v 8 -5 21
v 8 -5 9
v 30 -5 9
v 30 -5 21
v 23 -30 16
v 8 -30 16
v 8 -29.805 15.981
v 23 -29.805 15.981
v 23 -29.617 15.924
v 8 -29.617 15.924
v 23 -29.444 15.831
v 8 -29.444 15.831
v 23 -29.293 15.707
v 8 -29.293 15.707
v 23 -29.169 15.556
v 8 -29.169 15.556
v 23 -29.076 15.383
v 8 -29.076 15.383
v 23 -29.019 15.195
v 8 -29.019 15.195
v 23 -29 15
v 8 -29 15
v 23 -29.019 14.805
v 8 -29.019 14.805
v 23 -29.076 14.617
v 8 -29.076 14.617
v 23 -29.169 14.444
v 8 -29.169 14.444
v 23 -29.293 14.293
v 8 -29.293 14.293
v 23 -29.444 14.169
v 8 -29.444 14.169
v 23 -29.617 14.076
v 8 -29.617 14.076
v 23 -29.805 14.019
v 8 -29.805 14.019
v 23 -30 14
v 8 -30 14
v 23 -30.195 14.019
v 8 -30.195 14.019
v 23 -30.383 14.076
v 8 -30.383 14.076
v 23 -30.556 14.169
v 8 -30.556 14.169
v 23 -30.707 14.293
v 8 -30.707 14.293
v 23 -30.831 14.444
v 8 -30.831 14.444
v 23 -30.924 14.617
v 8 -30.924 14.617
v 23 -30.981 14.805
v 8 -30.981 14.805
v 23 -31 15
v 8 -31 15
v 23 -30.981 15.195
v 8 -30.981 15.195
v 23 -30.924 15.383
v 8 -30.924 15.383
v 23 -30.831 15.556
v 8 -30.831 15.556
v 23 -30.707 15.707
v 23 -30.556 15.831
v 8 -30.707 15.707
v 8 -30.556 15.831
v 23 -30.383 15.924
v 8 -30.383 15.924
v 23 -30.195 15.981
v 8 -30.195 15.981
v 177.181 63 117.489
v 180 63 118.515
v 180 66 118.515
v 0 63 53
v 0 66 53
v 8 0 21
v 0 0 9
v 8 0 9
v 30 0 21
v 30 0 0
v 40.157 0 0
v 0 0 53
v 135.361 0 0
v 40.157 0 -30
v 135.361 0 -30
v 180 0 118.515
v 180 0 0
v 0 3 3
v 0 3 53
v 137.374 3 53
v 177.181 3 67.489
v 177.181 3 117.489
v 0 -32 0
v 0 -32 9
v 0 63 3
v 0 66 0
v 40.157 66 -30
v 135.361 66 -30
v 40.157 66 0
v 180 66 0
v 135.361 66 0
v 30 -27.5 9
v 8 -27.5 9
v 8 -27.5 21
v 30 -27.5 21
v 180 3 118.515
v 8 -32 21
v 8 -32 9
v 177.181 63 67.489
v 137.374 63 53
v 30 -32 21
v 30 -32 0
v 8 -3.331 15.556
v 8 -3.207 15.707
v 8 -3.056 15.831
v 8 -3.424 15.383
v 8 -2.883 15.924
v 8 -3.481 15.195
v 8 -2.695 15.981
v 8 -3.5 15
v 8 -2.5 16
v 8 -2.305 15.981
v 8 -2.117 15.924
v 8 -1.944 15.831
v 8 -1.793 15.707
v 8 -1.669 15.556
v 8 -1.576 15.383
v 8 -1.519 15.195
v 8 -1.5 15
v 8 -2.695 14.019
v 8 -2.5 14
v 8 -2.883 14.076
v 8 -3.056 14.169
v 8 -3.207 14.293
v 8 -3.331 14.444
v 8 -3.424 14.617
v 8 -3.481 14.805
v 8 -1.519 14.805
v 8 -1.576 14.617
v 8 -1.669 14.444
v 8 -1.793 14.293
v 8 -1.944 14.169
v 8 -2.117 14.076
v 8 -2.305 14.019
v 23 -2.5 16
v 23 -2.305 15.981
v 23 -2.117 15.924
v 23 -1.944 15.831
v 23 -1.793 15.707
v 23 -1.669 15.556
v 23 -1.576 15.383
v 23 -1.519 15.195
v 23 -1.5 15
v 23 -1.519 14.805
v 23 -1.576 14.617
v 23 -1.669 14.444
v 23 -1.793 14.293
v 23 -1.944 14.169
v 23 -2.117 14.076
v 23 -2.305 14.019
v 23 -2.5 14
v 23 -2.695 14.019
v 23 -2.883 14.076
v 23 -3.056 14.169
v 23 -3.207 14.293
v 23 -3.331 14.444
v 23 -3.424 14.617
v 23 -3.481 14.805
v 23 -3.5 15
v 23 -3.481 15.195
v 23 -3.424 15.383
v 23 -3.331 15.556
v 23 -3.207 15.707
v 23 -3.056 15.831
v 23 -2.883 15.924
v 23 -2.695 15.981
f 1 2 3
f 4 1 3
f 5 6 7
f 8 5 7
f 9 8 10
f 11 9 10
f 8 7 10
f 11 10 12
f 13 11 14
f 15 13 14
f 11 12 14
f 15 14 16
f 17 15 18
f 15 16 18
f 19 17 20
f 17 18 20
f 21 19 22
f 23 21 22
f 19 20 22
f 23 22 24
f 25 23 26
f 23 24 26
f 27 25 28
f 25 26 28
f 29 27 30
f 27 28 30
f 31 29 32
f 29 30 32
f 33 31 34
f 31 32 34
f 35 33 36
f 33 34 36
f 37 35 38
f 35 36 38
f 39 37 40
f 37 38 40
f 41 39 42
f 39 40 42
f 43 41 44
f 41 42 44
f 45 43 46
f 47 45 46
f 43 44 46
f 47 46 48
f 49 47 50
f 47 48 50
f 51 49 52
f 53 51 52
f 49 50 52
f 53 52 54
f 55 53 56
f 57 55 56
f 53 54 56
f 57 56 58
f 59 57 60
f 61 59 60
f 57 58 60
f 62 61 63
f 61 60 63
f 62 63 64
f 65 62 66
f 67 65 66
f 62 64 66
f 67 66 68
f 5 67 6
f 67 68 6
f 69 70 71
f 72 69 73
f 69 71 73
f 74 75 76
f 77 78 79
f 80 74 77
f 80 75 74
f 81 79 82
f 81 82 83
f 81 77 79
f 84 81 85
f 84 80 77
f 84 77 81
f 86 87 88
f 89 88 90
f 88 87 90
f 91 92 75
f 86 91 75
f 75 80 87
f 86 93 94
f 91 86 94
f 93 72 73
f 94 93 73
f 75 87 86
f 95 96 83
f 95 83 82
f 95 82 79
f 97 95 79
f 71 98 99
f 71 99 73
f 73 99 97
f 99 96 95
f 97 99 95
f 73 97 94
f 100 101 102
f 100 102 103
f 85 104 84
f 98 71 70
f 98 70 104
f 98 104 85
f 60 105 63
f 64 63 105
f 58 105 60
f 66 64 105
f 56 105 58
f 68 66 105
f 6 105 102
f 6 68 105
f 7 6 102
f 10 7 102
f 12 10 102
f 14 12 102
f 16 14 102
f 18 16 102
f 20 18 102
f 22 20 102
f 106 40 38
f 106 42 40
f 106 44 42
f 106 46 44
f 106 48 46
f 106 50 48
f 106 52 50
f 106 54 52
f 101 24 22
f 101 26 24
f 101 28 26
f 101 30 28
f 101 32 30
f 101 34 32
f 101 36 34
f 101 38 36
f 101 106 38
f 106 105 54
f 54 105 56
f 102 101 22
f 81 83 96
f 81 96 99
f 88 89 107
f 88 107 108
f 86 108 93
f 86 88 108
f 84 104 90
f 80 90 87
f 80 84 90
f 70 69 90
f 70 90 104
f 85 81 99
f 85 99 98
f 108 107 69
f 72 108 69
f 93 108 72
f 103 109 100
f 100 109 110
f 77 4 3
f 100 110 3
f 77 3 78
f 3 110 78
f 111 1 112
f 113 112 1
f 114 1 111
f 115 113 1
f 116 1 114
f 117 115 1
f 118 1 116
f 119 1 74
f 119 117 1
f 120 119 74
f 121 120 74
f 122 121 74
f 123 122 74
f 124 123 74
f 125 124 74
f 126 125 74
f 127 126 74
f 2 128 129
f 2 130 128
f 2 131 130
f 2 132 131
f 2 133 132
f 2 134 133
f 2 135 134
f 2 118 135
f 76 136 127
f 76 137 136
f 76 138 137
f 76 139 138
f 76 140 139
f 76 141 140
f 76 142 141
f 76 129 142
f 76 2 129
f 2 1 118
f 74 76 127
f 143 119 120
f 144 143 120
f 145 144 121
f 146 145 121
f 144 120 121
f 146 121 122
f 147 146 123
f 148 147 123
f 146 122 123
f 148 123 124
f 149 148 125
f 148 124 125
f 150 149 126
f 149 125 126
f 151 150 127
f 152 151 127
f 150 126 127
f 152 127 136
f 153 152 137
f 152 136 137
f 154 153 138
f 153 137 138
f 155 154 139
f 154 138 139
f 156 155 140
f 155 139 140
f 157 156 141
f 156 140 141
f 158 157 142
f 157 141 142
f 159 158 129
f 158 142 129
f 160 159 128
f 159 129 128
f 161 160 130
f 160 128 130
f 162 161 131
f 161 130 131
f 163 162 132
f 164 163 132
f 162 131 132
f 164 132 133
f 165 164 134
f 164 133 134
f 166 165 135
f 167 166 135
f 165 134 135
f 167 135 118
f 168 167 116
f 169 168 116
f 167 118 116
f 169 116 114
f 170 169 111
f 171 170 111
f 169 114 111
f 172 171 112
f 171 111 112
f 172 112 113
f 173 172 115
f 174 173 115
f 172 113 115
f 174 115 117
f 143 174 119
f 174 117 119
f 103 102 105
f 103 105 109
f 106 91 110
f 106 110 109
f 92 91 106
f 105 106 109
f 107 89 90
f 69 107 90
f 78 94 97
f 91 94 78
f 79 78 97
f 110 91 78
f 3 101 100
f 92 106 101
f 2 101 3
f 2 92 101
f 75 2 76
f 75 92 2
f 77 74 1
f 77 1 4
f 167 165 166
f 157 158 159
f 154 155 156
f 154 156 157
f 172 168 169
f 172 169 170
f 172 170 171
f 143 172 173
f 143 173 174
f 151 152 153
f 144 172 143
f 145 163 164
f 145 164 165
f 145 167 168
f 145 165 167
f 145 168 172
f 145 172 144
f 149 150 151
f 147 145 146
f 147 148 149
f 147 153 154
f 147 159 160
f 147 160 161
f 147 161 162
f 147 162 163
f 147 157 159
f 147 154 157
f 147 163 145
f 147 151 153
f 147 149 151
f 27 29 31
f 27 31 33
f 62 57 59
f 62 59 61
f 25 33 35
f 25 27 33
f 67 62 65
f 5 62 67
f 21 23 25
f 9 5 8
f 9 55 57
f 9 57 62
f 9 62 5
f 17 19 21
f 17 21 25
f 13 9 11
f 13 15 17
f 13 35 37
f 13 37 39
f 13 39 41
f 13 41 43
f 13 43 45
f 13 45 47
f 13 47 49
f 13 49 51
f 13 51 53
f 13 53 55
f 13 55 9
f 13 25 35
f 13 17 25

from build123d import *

# Parameters (mm, degrees)
SKETCH_1_W          = 180
SKETCH_1_H          = 66
EXTRUDE_1_DEPTH     = 3
SKETCH_2_W          = 180
SKETCH_2_H          = 3
EXTRUDE_2_DEPTH     = 50
SKETCH_3_W          = 9
SKETCH_3_H          = 32
EXTRUDE_3_DEPTH     = 30
SKETCH_4_W          = 22
SKETCH_4_H          = 5
SKETCH_4_H_2        = 4.5
EXTRUDE_4_DEPTH     = 12
SKETCH_9_W          = 180
SKETCH_9_H          = 66
EXTRUDE_7_DEPTH     = 30
EXTRUDE_8_DEPTH     = 66
EXTRUDE_9_DEPTH     = 3
EXTRUDE_10_DEPTH    = 3
EXTRUDE_11_DEPTH    = 60
SKETCH_16_R         = 1
CUT_EXTRUDE_1_DEPTH = 15
SKETCH_17_W         = 40.157277222
SKETCH_17_H         = 30
SKETCH_17_W_2       = 44.638770814
CUT_EXTRUDE_2_DEPTH = 67


with BuildPart() as part:
    # 草圖1 → 填料-伸長1 (new body)
    with BuildSketch(Plane.XY):
        with Locations((90, 33)):
            Rectangle(SKETCH_1_W, SKETCH_1_H)
    extrude(amount=EXTRUDE_1_DEPTH)

    # 草圖2 → 填料-伸長2 (add)
    with BuildSketch(Plane.XY.offset(3)):
        with Locations((90, 1.5)):
            Rectangle(SKETCH_2_W, SKETCH_2_H)
        with Locations((90, 64.5)):
            Rectangle(SKETCH_2_W, SKETCH_2_H)
    extrude(amount=EXTRUDE_2_DEPTH)

    # 草圖3 → 填料-伸長3 (add)
    with BuildSketch(Plane.ZY):
        with Locations((4.5, -16)):
            Rectangle(SKETCH_3_W, SKETCH_3_H)
    extrude(amount=-EXTRUDE_3_DEPTH)

    # 草圖4 → 填料-伸長4 (add)
    with BuildSketch(Plane.XY.offset(9)):
        with Locations((19, -2.5)):
            Rectangle(SKETCH_4_W, SKETCH_4_H)
        with Locations((19, -29.75)):
            Rectangle(SKETCH_4_W, SKETCH_4_H_2)
    extrude(amount=EXTRUDE_4_DEPTH)

    # 草圖9 → 填料-伸長7 (add)
    with BuildSketch(Plane(origin=(0, 0, 0), x_dir=(-1, 0, 0), z_dir=(0, 0, -1))):
        with Locations((-90, 33)):
            Rectangle(SKETCH_9_W, SKETCH_9_H)
    extrude(amount=EXTRUDE_7_DEPTH)

    # 草圖10 → 填料-伸長8 (add)
    with BuildSketch(Plane.XZ):
        Polygon((0, 0), (180, 0), (180, 68.514642168), (0, 3), align=None)
    extrude(amount=-EXTRUDE_8_DEPTH)

    # 草圖11 → 填料-伸長9 (add)
    with BuildSketch(Plane.XZ):
        Polygon((180, 68.514642168), (180, 118.514642168), (0, 53), (137.373870973, 53), align=None)
    extrude(amount=-EXTRUDE_9_DEPTH)

    # 草圖12 → 填料-伸長10 (add)
    with BuildSketch(Plane(origin=(0, 66, 0), x_dir=(1, 0, 0), z_dir=(0, 1, 0))):
        Polygon((180, -68.514642168), (180, -118.514642168), (0, -53), (137.373870973, -53), align=None)
    extrude(amount=-EXTRUDE_10_DEPTH)

    # 草圖14 → 填料-伸長11 (add)
    with BuildSketch(Plane.XZ.offset(-63)):
        Polygon((180, 118.514642168), (180, 68.514642168), (177.180922138, 67.488581738), (177.180922138, 117.488581738), align=None)
    extrude(amount=EXTRUDE_11_DEPTH)

    # 草圖16 → 除料-伸長1 (cut)
    with BuildSketch(Plane.ZY.offset(-8)):
        with Locations((15, -2.5)):
            Circle(SKETCH_16_R)
        with Locations((15, -30)):
            Circle(SKETCH_16_R)
    extrude(amount=-CUT_EXTRUDE_1_DEPTH, mode=Mode.SUBTRACT)

    # 草圖17 → 除料-伸長2 (cut, through all)
    with BuildSketch(Plane.XZ):
        with Locations((20.078638611, -15)):
            Rectangle(SKETCH_17_W, SKETCH_17_H)
        with Locations((157.680614593, -15)):
            Rectangle(SKETCH_17_W_2, SKETCH_17_H)
    extrude(amount=-CUT_EXTRUDE_2_DEPTH, mode=Mode.SUBTRACT)


solid = part.part
